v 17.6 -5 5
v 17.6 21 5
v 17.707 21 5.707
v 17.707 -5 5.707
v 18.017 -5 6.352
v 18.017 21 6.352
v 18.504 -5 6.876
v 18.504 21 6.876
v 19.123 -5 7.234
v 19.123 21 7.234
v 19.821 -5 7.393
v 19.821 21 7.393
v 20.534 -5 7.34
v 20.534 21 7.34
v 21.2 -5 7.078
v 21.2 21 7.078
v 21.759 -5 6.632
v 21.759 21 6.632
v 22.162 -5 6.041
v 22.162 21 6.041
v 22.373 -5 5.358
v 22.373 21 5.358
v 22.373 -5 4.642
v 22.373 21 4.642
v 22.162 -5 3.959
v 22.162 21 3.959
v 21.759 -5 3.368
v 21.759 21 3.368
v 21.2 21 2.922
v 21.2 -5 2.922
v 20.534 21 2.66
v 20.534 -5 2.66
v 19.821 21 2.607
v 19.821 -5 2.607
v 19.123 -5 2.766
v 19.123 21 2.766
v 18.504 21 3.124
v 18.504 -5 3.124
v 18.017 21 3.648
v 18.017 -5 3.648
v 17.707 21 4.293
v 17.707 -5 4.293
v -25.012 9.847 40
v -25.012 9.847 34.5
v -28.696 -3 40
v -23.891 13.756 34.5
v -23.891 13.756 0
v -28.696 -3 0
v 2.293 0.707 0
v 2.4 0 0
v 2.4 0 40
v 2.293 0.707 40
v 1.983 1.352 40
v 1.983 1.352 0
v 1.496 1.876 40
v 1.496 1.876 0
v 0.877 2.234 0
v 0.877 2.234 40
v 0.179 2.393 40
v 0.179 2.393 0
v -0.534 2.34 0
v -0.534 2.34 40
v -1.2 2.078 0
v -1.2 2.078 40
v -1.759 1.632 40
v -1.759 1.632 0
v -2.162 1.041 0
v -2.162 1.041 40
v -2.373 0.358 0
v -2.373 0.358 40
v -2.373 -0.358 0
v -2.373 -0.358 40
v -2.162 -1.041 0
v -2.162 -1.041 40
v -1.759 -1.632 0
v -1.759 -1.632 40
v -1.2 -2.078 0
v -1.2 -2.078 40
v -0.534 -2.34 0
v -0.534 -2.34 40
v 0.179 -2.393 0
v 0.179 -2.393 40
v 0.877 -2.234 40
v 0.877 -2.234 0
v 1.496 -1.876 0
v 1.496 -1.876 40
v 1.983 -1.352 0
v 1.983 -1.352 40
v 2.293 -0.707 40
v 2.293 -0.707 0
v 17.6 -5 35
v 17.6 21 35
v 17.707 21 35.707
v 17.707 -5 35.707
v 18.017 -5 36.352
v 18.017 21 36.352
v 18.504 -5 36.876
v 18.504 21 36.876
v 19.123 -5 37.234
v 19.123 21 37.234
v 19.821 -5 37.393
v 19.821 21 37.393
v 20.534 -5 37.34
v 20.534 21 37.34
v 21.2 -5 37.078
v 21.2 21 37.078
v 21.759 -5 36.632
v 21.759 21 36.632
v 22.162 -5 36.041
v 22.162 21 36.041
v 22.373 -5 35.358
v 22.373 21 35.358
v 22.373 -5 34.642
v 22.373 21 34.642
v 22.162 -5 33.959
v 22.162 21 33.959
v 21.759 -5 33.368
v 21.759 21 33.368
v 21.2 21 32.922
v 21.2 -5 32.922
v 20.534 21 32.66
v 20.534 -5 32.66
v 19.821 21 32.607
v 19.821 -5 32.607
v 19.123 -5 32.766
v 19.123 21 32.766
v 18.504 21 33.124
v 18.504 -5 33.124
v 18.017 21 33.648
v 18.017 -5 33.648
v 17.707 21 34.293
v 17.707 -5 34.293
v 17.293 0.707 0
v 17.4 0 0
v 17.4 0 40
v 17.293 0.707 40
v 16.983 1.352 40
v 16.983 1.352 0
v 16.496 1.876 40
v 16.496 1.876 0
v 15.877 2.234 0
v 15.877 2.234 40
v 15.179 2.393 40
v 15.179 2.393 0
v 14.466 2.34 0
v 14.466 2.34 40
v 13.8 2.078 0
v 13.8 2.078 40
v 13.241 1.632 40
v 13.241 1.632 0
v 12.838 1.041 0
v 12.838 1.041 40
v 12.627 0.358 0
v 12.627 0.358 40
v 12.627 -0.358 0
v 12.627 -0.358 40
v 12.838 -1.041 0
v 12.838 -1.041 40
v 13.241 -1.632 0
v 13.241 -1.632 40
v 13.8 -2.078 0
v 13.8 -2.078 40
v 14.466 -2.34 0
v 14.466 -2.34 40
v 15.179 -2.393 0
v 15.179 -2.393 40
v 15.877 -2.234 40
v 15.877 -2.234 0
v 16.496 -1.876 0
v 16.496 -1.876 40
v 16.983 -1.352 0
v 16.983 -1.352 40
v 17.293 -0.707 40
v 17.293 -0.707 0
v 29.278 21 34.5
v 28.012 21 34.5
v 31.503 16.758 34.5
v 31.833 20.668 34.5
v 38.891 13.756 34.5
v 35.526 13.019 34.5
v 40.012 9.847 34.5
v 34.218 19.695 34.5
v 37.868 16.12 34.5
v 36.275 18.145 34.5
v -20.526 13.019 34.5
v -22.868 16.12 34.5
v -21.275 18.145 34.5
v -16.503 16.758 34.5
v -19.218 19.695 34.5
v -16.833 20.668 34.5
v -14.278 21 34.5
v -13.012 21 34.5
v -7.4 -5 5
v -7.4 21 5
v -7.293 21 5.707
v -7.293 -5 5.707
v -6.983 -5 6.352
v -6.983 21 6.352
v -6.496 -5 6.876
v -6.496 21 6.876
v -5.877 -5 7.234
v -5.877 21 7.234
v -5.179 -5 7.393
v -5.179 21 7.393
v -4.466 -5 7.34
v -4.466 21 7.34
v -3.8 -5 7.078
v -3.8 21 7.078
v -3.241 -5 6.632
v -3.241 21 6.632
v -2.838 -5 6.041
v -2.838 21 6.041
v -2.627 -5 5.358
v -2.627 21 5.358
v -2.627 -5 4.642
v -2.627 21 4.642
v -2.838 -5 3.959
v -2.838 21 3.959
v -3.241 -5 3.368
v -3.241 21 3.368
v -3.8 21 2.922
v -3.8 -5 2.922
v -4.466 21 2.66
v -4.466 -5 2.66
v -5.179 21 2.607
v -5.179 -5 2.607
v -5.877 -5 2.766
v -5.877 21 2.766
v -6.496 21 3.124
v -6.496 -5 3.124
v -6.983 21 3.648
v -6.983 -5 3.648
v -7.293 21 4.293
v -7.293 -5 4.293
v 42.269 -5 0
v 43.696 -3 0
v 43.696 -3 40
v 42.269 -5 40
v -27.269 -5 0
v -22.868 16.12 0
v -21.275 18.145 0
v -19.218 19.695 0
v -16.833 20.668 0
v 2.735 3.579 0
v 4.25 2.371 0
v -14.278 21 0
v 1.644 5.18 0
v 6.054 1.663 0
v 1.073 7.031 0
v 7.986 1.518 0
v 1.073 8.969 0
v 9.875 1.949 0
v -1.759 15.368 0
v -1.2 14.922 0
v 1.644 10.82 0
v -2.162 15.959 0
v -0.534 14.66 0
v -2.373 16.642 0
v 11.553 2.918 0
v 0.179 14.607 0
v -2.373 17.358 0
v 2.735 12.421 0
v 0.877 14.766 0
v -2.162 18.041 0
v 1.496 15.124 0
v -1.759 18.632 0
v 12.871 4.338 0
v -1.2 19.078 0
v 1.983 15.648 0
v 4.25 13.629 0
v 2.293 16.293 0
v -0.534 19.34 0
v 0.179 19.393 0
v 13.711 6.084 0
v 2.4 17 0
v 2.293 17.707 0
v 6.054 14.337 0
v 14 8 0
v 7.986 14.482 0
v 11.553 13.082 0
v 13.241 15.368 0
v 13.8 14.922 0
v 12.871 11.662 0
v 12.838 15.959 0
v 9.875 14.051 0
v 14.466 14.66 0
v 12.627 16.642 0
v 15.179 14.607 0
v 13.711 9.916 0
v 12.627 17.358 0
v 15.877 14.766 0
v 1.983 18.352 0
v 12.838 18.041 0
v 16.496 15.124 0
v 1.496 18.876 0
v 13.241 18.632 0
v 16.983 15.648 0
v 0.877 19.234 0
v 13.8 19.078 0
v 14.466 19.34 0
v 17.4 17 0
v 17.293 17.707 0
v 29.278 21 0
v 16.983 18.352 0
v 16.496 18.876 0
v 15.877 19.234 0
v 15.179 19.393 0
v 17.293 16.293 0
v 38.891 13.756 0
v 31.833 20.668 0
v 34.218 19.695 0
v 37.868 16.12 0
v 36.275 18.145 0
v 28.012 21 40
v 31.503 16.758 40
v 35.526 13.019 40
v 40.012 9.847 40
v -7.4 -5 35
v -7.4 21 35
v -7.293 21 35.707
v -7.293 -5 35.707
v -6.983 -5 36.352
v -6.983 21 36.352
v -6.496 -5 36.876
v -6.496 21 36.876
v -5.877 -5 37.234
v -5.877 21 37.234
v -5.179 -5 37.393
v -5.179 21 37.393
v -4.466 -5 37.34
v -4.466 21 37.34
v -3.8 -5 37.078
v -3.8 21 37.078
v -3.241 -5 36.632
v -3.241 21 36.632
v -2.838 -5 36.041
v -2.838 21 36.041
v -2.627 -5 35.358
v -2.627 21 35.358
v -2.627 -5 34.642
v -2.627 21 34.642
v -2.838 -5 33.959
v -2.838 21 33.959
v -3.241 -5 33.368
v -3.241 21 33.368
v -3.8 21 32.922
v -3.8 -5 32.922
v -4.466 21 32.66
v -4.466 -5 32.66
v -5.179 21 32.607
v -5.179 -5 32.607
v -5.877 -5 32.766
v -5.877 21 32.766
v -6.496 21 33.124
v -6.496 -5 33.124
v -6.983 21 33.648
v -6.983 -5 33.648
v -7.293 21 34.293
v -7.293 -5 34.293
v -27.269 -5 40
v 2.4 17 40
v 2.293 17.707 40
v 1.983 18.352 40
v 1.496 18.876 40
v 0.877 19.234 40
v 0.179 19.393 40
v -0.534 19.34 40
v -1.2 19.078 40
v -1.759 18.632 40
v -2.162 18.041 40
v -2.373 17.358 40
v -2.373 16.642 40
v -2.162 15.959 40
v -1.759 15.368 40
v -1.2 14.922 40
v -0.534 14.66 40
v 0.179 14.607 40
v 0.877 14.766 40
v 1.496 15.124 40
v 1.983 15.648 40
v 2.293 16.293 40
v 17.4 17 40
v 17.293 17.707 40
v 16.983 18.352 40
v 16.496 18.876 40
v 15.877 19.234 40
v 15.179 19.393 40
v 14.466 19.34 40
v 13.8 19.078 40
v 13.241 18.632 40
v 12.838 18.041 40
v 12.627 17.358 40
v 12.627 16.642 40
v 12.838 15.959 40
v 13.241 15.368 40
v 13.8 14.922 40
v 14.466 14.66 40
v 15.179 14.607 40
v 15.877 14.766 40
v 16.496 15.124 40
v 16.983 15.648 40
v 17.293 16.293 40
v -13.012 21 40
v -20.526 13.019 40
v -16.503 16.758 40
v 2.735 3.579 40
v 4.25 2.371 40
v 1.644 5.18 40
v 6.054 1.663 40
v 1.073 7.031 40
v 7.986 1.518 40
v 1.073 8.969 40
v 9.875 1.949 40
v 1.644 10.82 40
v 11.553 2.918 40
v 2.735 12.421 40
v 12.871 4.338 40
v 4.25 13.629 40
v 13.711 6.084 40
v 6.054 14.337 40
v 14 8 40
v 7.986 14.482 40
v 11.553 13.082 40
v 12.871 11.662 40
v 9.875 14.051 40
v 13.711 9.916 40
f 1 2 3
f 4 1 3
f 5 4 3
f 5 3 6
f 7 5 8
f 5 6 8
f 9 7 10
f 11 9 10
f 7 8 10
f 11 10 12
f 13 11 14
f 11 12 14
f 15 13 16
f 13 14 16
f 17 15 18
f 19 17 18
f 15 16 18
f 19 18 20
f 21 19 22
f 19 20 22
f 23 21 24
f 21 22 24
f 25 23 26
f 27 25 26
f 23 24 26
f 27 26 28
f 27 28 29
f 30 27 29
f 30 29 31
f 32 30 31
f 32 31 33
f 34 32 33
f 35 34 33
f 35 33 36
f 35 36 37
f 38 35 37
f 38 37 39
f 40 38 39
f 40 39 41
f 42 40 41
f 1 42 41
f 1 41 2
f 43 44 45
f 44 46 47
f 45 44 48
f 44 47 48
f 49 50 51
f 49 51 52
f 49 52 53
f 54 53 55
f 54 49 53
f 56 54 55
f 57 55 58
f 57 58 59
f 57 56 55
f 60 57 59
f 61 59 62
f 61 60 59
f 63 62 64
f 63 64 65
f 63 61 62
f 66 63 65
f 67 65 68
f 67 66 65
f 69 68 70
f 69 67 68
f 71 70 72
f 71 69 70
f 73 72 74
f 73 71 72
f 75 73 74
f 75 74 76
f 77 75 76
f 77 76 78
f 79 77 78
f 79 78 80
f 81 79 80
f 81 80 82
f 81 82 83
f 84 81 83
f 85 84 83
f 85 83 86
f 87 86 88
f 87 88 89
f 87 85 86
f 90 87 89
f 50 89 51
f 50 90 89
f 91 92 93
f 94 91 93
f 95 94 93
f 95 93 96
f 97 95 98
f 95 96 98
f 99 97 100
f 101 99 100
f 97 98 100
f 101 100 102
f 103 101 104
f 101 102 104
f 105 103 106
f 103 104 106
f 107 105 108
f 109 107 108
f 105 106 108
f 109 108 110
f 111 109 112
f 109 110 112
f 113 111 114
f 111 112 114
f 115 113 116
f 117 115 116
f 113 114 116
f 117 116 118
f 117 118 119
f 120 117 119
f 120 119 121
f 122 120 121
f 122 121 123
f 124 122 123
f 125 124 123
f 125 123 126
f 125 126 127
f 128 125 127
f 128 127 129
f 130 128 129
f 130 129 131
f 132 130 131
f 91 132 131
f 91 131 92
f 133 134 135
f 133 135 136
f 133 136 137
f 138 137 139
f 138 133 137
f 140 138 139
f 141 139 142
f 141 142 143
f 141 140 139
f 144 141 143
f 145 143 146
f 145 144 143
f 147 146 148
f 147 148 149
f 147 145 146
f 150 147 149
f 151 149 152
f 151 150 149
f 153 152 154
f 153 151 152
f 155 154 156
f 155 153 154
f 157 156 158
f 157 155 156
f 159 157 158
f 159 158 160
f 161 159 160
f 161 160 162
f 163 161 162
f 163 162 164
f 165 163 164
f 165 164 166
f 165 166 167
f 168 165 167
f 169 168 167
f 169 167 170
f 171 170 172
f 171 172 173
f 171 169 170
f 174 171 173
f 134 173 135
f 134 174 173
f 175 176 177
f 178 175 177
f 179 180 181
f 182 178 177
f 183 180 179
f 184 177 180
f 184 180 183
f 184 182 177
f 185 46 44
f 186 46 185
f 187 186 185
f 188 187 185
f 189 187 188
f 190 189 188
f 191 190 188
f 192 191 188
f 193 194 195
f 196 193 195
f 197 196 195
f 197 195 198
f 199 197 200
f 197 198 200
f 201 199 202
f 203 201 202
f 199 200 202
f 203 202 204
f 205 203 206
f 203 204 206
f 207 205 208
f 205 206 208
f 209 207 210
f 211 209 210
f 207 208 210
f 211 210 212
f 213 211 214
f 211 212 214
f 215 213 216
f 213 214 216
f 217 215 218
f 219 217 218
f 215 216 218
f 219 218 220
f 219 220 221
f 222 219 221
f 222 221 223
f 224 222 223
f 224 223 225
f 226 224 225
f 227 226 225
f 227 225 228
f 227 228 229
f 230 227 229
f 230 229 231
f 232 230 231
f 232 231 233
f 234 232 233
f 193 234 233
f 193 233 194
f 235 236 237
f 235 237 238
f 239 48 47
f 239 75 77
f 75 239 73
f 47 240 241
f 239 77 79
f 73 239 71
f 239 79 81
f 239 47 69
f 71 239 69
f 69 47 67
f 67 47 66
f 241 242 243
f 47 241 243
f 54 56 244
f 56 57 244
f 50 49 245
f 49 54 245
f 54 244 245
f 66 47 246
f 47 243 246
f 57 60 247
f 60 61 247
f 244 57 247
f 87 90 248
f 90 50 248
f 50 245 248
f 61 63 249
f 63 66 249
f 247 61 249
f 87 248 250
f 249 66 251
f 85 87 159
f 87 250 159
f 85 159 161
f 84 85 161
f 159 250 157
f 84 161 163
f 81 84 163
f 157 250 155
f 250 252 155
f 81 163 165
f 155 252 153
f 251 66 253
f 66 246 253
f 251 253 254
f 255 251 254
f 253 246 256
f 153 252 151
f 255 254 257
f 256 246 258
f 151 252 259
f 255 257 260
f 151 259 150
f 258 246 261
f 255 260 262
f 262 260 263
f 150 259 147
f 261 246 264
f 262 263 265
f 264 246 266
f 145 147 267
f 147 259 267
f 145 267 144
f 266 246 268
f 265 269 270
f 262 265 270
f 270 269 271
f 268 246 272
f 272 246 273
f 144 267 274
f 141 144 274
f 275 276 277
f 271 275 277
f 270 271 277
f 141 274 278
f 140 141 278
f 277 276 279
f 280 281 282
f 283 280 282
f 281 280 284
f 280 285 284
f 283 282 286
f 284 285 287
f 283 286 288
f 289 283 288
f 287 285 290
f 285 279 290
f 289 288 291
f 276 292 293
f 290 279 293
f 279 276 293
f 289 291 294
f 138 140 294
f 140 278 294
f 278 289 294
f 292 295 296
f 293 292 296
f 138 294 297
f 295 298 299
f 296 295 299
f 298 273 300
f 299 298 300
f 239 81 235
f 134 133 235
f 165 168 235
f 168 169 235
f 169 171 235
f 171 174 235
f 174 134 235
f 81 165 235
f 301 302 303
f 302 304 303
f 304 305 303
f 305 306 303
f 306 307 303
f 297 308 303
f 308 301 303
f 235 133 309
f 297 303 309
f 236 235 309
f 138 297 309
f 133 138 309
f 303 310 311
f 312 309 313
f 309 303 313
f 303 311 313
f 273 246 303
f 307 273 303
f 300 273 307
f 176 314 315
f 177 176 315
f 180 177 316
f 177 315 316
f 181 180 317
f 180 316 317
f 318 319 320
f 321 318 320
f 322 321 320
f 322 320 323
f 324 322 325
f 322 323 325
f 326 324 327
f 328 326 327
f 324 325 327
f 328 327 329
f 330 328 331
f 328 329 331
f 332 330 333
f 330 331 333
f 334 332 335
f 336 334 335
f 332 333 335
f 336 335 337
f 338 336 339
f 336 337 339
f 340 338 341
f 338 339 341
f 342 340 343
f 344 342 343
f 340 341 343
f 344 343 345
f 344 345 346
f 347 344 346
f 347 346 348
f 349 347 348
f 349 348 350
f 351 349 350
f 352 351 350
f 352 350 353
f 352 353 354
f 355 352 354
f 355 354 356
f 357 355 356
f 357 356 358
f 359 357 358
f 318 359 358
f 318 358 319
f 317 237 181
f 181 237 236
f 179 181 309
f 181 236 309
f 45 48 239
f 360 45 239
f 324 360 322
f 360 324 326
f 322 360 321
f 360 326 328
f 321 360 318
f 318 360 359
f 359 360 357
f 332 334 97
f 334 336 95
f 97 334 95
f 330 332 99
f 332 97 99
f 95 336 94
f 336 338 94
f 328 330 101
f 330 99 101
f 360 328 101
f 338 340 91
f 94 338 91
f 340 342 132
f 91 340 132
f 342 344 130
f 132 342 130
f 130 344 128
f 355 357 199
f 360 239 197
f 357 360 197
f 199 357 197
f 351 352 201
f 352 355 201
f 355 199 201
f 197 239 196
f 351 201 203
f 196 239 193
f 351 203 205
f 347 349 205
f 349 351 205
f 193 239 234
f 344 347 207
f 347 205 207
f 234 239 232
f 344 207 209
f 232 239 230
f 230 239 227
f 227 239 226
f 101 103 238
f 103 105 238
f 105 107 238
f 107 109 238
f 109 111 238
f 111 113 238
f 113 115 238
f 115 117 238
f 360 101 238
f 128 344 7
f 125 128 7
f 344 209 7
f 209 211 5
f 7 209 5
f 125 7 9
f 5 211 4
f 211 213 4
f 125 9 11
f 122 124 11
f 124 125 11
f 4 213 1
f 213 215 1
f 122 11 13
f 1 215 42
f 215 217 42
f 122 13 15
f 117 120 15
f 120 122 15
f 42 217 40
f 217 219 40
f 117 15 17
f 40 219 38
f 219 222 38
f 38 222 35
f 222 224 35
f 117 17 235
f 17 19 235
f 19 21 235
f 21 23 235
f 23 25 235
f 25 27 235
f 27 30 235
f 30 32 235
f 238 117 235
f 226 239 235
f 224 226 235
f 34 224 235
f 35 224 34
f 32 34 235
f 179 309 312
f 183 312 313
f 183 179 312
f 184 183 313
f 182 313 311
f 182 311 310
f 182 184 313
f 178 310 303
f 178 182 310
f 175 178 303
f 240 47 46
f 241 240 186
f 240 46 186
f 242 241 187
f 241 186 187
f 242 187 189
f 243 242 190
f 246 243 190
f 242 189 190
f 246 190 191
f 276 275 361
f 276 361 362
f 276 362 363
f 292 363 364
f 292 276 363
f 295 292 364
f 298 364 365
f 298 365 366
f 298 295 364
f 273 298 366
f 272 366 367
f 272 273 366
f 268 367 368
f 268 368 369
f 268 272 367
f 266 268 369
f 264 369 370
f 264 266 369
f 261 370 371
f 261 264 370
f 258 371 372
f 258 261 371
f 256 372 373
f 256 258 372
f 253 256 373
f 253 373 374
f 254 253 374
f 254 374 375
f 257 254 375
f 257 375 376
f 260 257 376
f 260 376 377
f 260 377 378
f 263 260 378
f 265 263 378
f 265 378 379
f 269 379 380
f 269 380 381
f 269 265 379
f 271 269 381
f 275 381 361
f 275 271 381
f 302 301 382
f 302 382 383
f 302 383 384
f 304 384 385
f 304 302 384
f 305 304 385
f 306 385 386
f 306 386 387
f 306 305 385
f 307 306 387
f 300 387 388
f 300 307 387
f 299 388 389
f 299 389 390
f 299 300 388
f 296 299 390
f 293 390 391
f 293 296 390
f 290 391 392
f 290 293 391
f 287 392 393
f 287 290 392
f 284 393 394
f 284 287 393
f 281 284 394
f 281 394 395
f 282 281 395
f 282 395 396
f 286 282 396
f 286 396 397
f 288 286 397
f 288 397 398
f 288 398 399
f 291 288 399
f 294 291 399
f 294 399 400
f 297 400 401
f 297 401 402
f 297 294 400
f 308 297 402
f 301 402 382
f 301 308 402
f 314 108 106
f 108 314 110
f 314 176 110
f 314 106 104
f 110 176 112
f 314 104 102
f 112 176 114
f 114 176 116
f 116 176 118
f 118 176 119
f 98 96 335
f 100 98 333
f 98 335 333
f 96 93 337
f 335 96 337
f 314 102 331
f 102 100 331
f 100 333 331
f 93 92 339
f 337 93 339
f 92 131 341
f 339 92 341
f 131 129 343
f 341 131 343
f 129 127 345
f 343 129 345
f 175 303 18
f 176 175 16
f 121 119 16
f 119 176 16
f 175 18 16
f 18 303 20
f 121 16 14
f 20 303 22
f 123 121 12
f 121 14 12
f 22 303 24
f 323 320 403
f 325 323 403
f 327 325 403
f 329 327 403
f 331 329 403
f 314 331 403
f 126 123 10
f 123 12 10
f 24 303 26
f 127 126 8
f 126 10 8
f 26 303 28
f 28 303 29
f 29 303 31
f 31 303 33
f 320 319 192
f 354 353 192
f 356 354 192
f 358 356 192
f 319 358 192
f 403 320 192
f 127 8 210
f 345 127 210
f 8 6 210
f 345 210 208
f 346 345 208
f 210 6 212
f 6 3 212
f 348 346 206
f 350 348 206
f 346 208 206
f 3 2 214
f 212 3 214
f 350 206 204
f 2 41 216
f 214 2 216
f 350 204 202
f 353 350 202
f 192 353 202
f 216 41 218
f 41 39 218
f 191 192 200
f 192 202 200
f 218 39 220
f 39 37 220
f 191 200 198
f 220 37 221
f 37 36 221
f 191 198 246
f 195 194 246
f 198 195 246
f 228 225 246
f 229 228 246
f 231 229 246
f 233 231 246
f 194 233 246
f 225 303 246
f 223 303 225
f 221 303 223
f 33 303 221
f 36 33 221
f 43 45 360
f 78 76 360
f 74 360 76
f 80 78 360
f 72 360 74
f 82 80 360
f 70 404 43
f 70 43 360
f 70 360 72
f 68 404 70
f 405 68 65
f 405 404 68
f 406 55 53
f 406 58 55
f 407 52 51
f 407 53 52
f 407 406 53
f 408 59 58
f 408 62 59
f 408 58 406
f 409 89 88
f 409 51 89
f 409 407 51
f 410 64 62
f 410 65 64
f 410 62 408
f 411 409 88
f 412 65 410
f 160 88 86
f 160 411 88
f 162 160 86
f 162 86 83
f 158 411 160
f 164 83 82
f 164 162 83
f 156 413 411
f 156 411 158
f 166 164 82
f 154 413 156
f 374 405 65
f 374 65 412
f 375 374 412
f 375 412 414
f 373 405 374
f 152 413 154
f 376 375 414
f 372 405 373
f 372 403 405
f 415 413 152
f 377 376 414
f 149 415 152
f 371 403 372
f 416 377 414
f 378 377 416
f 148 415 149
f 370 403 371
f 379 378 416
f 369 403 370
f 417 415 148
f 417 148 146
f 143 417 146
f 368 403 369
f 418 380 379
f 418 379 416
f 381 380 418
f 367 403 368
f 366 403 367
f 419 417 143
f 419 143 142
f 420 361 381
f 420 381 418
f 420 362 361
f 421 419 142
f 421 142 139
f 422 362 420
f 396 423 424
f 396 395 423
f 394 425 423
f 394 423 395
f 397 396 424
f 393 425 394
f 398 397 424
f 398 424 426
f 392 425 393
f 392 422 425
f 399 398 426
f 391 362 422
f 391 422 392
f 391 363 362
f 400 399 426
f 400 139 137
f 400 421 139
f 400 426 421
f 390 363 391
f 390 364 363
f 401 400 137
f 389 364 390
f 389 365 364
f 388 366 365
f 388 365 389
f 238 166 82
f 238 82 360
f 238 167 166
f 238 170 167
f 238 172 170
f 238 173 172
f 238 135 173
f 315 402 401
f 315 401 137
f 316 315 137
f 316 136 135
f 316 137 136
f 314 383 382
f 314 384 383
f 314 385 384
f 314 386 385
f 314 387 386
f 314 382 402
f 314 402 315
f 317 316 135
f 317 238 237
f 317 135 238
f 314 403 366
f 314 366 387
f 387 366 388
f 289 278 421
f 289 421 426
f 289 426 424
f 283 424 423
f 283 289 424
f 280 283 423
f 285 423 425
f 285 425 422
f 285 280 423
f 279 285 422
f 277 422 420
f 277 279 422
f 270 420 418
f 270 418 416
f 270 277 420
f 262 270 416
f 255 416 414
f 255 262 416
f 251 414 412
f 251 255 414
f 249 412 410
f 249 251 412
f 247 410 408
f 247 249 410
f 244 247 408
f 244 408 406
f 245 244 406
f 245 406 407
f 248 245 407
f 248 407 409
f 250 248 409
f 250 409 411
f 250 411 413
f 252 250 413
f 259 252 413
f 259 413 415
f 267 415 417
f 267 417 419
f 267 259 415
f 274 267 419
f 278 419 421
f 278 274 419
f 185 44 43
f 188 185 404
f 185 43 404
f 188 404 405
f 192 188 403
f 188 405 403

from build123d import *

# Parameters (mm, degrees)
SKETCH_1_R          = 2.4
SKETCH_1_R_2        = 6.5
EXTRUDE_1_DEPTH     = 40
FILLET_1_R          = 10
SKETCH_2_R          = 2.4
CUT_EXTRUDE_1_DEPTH = 66.0828238
SKETCH_4_R          = 41.2
CUT_EXTRUDE_2_DEPTH = 5.5
CUT_EXTRUDE_3_DEPTH = 64.25167155


with BuildPart() as part:
    # 草图1 → 凸台-拉伸1 (new body)
    with BuildSketch(Plane.XY):
        Polygon((-29.269334238, -5), (44.269334238, -5), (36.813954208, 21), (-21.813954208, 21), align=None)
        with Locations((15, 17)):
            Circle(SKETCH_1_R, mode=Mode.SUBTRACT)
        with Locations((15, 0)):
            Circle(SKETCH_1_R, mode=Mode.SUBTRACT)
        Circle(SKETCH_1_R, mode=Mode.SUBTRACT)
        with Locations((0, 17)):
            Circle(SKETCH_1_R, mode=Mode.SUBTRACT)
        with Locations((7.5, 8)):
            Circle(SKETCH_1_R_2, mode=Mode.SUBTRACT)
    extrude(amount=EXTRUDE_1_DEPTH)

    # 圆角1
    fillet_1_edges = [part.edges().sort_by_distance(p)[0] for p in [
        (-21.813954208, 21, 20),
        (36.813954208, 21, 20),
    ]]
    fillet(fillet_1_edges, radius=FILLET_1_R)

    # 草图2 → 切除-拉伸1 (cut, through all)
    with BuildSketch(Plane(origin=(0, 21, 0), x_dir=(1, 0, 0), z_dir=(0, 1, 0))):
        with Locations(Location((-5, -5, 0), (0, 0, 180))):
            Circle(SKETCH_2_R)
        with Locations(Location((20, -5, 0), (0, 0, 180))):
            Circle(SKETCH_2_R)
        with Locations(Location((-5, -35, 0), (0, 0, 180))):
            Circle(SKETCH_2_R)
        with Locations(Location((20, -35, 0), (0, 0, 180))):
            Circle(SKETCH_2_R)
    extrude(amount=-CUT_EXTRUDE_1_DEPTH, mode=Mode.SUBTRACT)

    # 草图4 → 切除-拉伸2 (cut)
    with BuildSketch(Plane.XY.offset(40)):
        with Locations((-46.5, 45)):
            Circle(SKETCH_4_R)
        with Locations((61.5, 45)):
            Circle(SKETCH_4_R)
    extrude(amount=-CUT_EXTRUDE_2_DEPTH, mode=Mode.SUBTRACT)

    # 草图5 → 切除-拉伸3 (cut, through all)
    with BuildSketch(Plane(origin=(0, 0, 0), x_dir=(-1, 0, 0), z_dir=(0, 0, -1))):
        Polygon((-42.269334238, -5), (-44.269334238, -5), (-43.695843466, -3), align=None)
        Polygon((28.695843466, -3), (27.269334238, -5), (29.269334238, -5), align=None)
    extrude(amount=-CUT_EXTRUDE_3_DEPTH, mode=Mode.SUBTRACT)


solid = part.part
